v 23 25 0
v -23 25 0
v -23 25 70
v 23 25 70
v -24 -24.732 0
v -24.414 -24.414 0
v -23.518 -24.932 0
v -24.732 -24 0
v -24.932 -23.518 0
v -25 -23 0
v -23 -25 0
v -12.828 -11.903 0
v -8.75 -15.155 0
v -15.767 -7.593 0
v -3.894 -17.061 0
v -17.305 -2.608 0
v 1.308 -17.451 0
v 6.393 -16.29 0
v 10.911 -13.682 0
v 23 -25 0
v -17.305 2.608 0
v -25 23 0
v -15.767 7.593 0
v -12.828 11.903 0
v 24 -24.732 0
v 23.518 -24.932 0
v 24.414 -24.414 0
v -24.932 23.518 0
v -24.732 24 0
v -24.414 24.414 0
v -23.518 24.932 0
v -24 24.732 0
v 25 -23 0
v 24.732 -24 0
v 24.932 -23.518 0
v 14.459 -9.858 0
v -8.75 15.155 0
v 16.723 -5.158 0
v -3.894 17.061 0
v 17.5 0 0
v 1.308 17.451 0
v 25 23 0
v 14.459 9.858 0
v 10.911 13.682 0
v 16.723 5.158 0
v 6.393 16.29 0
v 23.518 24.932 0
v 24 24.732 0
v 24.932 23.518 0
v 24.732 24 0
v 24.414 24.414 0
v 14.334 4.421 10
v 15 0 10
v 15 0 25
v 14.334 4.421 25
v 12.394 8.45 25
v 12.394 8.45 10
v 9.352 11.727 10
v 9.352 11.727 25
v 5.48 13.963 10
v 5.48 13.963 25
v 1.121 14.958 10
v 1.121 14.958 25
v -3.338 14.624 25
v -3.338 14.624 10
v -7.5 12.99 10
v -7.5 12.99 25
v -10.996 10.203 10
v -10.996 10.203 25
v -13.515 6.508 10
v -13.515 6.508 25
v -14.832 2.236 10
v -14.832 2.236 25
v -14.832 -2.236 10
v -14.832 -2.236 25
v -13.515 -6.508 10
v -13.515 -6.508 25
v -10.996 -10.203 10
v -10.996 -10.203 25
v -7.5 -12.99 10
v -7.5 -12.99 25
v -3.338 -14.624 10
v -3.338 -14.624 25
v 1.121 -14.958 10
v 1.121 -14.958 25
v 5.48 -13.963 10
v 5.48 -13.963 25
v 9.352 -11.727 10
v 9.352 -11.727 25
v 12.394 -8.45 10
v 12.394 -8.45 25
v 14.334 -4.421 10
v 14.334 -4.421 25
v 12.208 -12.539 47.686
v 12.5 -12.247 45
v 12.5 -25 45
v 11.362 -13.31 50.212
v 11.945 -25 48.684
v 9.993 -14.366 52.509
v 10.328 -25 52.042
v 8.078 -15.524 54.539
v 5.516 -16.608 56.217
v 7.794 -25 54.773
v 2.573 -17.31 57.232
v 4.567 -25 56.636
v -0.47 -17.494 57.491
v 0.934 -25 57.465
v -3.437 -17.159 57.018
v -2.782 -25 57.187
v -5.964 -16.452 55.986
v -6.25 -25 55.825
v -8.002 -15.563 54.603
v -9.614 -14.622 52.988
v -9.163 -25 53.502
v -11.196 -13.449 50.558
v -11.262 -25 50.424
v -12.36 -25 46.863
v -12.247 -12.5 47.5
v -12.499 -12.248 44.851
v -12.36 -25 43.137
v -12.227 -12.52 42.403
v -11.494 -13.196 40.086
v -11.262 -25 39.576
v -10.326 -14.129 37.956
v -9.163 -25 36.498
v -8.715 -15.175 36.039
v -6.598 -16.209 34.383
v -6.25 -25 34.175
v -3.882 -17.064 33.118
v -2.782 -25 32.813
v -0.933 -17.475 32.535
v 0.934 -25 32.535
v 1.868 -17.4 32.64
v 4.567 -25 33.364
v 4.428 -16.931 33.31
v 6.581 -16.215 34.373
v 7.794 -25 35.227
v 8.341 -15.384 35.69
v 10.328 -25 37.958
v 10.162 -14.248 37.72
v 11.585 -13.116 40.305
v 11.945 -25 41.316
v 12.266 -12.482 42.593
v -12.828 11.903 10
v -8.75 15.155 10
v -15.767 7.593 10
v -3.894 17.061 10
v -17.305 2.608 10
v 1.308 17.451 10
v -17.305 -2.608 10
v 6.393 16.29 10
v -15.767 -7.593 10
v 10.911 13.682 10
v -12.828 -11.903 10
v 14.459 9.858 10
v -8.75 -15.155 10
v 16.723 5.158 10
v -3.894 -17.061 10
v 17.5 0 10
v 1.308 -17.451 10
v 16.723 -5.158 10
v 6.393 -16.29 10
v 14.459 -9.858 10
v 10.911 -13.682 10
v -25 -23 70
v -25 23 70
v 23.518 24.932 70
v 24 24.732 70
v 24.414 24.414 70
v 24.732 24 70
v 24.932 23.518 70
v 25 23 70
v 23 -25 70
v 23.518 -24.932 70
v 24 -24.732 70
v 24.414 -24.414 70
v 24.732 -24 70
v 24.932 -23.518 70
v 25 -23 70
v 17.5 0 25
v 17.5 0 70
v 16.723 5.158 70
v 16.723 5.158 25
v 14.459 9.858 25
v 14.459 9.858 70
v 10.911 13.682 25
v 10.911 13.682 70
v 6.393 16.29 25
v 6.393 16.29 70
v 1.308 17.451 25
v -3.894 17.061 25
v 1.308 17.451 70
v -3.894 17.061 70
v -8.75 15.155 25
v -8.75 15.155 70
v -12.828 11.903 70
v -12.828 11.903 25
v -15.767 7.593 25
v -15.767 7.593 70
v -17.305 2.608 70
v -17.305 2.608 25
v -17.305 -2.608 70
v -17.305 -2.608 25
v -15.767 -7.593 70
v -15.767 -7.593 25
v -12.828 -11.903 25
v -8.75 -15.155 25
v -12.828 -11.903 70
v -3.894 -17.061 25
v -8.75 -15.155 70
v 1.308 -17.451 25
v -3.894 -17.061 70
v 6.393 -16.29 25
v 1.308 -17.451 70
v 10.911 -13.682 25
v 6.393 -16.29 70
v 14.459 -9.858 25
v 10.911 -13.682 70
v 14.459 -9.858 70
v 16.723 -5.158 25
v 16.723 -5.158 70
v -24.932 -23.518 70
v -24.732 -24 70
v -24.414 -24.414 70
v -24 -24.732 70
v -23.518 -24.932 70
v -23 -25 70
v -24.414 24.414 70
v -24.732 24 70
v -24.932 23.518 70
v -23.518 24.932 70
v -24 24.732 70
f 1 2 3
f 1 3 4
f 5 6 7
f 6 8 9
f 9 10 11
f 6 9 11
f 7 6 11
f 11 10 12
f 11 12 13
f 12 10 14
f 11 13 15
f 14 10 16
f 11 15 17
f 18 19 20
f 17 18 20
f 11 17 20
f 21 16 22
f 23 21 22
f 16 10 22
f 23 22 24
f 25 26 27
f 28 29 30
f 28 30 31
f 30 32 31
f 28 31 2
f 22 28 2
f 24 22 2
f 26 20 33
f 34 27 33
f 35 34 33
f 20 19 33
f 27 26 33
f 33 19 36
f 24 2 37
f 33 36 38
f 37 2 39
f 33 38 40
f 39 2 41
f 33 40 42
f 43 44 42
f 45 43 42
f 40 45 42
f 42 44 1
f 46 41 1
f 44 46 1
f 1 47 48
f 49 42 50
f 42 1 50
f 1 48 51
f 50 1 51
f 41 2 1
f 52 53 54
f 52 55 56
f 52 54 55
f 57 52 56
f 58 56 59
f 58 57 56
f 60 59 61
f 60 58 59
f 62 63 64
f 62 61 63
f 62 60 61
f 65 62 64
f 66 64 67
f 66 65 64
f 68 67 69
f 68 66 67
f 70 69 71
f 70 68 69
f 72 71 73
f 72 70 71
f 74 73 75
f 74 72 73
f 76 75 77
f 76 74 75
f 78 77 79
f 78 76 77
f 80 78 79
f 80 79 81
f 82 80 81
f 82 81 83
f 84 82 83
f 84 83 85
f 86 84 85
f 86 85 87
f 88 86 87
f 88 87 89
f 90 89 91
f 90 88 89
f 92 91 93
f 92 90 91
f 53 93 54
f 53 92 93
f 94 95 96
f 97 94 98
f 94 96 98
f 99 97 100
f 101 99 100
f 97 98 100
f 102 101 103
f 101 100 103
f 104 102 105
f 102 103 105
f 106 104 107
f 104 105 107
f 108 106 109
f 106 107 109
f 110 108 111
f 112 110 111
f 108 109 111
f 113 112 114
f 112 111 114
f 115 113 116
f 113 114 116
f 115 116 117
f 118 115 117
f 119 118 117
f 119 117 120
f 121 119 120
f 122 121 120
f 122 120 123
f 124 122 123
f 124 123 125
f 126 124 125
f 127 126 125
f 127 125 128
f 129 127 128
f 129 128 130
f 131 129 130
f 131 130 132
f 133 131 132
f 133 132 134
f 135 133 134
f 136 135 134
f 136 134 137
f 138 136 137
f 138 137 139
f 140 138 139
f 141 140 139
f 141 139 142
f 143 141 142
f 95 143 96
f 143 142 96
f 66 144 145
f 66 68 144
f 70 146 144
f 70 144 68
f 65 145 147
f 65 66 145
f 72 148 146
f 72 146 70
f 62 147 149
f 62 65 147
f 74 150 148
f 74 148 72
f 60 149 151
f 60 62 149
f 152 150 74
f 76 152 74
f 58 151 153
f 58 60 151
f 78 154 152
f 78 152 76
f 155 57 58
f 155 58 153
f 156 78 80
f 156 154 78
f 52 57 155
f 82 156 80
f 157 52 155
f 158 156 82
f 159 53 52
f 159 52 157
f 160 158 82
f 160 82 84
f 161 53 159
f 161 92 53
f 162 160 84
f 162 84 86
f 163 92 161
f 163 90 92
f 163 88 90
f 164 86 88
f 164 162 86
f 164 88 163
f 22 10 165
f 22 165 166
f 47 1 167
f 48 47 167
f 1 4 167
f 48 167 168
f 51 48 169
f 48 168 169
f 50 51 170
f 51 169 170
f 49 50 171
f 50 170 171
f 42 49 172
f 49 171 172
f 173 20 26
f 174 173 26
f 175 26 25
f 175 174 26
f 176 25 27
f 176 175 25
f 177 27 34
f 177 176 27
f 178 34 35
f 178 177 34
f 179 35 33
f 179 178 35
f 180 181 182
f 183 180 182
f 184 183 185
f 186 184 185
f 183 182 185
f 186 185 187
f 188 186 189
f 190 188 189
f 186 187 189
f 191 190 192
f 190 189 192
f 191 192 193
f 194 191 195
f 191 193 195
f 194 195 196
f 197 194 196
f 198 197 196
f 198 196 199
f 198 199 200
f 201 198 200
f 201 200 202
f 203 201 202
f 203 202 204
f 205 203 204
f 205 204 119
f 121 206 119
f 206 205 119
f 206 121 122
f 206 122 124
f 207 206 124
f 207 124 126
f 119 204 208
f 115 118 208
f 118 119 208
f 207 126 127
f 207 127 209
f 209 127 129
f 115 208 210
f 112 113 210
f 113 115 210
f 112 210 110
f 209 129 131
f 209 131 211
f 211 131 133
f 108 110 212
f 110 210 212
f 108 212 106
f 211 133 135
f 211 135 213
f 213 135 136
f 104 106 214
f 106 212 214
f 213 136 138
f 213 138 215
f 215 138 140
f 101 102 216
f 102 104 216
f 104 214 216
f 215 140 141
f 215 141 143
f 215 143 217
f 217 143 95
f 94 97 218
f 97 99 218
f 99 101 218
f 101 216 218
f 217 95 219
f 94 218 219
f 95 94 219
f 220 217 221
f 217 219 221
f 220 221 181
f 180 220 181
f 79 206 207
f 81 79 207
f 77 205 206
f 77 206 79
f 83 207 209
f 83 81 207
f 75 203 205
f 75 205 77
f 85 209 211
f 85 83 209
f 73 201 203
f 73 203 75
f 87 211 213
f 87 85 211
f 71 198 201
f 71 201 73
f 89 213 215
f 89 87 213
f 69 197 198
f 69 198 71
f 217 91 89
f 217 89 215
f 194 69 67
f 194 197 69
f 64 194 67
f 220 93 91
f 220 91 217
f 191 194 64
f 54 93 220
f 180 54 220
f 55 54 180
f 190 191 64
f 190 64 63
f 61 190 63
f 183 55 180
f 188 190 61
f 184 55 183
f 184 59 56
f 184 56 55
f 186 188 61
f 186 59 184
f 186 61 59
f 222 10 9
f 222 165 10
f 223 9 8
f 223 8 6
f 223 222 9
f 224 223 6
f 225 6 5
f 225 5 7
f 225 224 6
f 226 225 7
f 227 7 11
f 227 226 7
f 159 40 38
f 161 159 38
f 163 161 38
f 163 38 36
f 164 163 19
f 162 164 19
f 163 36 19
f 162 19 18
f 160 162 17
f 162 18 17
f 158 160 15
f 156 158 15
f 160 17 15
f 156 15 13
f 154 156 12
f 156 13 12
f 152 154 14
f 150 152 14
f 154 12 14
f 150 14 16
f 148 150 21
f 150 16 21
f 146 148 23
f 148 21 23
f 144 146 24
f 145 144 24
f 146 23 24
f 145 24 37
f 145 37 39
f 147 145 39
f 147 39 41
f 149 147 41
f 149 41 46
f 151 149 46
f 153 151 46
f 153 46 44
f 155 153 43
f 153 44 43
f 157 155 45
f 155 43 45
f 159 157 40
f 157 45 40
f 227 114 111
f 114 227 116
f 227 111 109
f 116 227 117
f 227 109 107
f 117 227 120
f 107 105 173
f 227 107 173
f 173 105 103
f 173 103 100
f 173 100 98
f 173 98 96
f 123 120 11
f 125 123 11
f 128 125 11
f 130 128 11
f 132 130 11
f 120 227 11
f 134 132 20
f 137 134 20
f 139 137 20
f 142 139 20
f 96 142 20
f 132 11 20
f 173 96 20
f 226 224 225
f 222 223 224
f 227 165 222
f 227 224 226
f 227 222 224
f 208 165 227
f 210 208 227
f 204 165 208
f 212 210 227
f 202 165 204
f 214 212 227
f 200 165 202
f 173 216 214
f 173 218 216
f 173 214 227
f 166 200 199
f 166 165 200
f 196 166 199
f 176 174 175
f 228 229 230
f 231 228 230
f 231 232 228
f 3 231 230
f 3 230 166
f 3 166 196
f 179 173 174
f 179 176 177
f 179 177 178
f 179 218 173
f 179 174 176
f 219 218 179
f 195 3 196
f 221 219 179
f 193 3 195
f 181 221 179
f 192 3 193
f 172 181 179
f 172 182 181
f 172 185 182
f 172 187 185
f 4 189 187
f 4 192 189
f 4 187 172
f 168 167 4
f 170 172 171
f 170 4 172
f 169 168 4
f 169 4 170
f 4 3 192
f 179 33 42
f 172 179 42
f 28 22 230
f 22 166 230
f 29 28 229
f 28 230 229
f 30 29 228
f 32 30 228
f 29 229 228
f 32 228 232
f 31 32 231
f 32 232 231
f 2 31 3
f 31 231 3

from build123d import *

# Parameters (mm, degrees)
F0_W     = 50
F0_H     = 50
F0_R     = 15
F1_DEPTH = 70
F2_R     = 12.5
F3_DEPTH = 25
F4_R     = 17.5
F5_DEPTH = 45
F6_R     = 17.5
F7_DEPTH = 10
F8_R     = 2


with BuildPart() as f1:
    # F0 (on Top) → F1 (new body)
    with BuildSketch(Plane.XY):
        Rectangle(F0_W, F0_H)
        Circle(F0_R, mode=Mode.SUBTRACT)
    extrude(amount=F1_DEPTH)

    # F2 (on face) → F3 (cut)
    with BuildSketch(Plane.XZ.offset(25)):
        with Locations((0, 45)):
            Circle(F2_R)
    extrude(amount=-F3_DEPTH, mode=Mode.SUBTRACT)

    # F4 (on face) → F5 (cut)
    with BuildSketch(Plane.XY.offset(70)):
        Circle(F4_R)
    extrude(amount=-F5_DEPTH, mode=Mode.SUBTRACT)

    # F6 (on face) → F7 (cut)
    with BuildSketch(Plane(origin=(0, 0, 0), x_dir=(1, 0, 0), z_dir=(0, 0, -1))):
        Circle(F6_R)
    extrude(amount=-F7_DEPTH, mode=Mode.SUBTRACT)

    # F8
    f8_edges = [f1.edges().sort_by_distance(p)[0] for p in [
        (-25, -25, 35),
        (25, -25, 35),
        (25, 25, 35),
        (-25, 25, 35),
    ]]
    fillet(f8_edges, radius=F8_R)


solid = f1.part
